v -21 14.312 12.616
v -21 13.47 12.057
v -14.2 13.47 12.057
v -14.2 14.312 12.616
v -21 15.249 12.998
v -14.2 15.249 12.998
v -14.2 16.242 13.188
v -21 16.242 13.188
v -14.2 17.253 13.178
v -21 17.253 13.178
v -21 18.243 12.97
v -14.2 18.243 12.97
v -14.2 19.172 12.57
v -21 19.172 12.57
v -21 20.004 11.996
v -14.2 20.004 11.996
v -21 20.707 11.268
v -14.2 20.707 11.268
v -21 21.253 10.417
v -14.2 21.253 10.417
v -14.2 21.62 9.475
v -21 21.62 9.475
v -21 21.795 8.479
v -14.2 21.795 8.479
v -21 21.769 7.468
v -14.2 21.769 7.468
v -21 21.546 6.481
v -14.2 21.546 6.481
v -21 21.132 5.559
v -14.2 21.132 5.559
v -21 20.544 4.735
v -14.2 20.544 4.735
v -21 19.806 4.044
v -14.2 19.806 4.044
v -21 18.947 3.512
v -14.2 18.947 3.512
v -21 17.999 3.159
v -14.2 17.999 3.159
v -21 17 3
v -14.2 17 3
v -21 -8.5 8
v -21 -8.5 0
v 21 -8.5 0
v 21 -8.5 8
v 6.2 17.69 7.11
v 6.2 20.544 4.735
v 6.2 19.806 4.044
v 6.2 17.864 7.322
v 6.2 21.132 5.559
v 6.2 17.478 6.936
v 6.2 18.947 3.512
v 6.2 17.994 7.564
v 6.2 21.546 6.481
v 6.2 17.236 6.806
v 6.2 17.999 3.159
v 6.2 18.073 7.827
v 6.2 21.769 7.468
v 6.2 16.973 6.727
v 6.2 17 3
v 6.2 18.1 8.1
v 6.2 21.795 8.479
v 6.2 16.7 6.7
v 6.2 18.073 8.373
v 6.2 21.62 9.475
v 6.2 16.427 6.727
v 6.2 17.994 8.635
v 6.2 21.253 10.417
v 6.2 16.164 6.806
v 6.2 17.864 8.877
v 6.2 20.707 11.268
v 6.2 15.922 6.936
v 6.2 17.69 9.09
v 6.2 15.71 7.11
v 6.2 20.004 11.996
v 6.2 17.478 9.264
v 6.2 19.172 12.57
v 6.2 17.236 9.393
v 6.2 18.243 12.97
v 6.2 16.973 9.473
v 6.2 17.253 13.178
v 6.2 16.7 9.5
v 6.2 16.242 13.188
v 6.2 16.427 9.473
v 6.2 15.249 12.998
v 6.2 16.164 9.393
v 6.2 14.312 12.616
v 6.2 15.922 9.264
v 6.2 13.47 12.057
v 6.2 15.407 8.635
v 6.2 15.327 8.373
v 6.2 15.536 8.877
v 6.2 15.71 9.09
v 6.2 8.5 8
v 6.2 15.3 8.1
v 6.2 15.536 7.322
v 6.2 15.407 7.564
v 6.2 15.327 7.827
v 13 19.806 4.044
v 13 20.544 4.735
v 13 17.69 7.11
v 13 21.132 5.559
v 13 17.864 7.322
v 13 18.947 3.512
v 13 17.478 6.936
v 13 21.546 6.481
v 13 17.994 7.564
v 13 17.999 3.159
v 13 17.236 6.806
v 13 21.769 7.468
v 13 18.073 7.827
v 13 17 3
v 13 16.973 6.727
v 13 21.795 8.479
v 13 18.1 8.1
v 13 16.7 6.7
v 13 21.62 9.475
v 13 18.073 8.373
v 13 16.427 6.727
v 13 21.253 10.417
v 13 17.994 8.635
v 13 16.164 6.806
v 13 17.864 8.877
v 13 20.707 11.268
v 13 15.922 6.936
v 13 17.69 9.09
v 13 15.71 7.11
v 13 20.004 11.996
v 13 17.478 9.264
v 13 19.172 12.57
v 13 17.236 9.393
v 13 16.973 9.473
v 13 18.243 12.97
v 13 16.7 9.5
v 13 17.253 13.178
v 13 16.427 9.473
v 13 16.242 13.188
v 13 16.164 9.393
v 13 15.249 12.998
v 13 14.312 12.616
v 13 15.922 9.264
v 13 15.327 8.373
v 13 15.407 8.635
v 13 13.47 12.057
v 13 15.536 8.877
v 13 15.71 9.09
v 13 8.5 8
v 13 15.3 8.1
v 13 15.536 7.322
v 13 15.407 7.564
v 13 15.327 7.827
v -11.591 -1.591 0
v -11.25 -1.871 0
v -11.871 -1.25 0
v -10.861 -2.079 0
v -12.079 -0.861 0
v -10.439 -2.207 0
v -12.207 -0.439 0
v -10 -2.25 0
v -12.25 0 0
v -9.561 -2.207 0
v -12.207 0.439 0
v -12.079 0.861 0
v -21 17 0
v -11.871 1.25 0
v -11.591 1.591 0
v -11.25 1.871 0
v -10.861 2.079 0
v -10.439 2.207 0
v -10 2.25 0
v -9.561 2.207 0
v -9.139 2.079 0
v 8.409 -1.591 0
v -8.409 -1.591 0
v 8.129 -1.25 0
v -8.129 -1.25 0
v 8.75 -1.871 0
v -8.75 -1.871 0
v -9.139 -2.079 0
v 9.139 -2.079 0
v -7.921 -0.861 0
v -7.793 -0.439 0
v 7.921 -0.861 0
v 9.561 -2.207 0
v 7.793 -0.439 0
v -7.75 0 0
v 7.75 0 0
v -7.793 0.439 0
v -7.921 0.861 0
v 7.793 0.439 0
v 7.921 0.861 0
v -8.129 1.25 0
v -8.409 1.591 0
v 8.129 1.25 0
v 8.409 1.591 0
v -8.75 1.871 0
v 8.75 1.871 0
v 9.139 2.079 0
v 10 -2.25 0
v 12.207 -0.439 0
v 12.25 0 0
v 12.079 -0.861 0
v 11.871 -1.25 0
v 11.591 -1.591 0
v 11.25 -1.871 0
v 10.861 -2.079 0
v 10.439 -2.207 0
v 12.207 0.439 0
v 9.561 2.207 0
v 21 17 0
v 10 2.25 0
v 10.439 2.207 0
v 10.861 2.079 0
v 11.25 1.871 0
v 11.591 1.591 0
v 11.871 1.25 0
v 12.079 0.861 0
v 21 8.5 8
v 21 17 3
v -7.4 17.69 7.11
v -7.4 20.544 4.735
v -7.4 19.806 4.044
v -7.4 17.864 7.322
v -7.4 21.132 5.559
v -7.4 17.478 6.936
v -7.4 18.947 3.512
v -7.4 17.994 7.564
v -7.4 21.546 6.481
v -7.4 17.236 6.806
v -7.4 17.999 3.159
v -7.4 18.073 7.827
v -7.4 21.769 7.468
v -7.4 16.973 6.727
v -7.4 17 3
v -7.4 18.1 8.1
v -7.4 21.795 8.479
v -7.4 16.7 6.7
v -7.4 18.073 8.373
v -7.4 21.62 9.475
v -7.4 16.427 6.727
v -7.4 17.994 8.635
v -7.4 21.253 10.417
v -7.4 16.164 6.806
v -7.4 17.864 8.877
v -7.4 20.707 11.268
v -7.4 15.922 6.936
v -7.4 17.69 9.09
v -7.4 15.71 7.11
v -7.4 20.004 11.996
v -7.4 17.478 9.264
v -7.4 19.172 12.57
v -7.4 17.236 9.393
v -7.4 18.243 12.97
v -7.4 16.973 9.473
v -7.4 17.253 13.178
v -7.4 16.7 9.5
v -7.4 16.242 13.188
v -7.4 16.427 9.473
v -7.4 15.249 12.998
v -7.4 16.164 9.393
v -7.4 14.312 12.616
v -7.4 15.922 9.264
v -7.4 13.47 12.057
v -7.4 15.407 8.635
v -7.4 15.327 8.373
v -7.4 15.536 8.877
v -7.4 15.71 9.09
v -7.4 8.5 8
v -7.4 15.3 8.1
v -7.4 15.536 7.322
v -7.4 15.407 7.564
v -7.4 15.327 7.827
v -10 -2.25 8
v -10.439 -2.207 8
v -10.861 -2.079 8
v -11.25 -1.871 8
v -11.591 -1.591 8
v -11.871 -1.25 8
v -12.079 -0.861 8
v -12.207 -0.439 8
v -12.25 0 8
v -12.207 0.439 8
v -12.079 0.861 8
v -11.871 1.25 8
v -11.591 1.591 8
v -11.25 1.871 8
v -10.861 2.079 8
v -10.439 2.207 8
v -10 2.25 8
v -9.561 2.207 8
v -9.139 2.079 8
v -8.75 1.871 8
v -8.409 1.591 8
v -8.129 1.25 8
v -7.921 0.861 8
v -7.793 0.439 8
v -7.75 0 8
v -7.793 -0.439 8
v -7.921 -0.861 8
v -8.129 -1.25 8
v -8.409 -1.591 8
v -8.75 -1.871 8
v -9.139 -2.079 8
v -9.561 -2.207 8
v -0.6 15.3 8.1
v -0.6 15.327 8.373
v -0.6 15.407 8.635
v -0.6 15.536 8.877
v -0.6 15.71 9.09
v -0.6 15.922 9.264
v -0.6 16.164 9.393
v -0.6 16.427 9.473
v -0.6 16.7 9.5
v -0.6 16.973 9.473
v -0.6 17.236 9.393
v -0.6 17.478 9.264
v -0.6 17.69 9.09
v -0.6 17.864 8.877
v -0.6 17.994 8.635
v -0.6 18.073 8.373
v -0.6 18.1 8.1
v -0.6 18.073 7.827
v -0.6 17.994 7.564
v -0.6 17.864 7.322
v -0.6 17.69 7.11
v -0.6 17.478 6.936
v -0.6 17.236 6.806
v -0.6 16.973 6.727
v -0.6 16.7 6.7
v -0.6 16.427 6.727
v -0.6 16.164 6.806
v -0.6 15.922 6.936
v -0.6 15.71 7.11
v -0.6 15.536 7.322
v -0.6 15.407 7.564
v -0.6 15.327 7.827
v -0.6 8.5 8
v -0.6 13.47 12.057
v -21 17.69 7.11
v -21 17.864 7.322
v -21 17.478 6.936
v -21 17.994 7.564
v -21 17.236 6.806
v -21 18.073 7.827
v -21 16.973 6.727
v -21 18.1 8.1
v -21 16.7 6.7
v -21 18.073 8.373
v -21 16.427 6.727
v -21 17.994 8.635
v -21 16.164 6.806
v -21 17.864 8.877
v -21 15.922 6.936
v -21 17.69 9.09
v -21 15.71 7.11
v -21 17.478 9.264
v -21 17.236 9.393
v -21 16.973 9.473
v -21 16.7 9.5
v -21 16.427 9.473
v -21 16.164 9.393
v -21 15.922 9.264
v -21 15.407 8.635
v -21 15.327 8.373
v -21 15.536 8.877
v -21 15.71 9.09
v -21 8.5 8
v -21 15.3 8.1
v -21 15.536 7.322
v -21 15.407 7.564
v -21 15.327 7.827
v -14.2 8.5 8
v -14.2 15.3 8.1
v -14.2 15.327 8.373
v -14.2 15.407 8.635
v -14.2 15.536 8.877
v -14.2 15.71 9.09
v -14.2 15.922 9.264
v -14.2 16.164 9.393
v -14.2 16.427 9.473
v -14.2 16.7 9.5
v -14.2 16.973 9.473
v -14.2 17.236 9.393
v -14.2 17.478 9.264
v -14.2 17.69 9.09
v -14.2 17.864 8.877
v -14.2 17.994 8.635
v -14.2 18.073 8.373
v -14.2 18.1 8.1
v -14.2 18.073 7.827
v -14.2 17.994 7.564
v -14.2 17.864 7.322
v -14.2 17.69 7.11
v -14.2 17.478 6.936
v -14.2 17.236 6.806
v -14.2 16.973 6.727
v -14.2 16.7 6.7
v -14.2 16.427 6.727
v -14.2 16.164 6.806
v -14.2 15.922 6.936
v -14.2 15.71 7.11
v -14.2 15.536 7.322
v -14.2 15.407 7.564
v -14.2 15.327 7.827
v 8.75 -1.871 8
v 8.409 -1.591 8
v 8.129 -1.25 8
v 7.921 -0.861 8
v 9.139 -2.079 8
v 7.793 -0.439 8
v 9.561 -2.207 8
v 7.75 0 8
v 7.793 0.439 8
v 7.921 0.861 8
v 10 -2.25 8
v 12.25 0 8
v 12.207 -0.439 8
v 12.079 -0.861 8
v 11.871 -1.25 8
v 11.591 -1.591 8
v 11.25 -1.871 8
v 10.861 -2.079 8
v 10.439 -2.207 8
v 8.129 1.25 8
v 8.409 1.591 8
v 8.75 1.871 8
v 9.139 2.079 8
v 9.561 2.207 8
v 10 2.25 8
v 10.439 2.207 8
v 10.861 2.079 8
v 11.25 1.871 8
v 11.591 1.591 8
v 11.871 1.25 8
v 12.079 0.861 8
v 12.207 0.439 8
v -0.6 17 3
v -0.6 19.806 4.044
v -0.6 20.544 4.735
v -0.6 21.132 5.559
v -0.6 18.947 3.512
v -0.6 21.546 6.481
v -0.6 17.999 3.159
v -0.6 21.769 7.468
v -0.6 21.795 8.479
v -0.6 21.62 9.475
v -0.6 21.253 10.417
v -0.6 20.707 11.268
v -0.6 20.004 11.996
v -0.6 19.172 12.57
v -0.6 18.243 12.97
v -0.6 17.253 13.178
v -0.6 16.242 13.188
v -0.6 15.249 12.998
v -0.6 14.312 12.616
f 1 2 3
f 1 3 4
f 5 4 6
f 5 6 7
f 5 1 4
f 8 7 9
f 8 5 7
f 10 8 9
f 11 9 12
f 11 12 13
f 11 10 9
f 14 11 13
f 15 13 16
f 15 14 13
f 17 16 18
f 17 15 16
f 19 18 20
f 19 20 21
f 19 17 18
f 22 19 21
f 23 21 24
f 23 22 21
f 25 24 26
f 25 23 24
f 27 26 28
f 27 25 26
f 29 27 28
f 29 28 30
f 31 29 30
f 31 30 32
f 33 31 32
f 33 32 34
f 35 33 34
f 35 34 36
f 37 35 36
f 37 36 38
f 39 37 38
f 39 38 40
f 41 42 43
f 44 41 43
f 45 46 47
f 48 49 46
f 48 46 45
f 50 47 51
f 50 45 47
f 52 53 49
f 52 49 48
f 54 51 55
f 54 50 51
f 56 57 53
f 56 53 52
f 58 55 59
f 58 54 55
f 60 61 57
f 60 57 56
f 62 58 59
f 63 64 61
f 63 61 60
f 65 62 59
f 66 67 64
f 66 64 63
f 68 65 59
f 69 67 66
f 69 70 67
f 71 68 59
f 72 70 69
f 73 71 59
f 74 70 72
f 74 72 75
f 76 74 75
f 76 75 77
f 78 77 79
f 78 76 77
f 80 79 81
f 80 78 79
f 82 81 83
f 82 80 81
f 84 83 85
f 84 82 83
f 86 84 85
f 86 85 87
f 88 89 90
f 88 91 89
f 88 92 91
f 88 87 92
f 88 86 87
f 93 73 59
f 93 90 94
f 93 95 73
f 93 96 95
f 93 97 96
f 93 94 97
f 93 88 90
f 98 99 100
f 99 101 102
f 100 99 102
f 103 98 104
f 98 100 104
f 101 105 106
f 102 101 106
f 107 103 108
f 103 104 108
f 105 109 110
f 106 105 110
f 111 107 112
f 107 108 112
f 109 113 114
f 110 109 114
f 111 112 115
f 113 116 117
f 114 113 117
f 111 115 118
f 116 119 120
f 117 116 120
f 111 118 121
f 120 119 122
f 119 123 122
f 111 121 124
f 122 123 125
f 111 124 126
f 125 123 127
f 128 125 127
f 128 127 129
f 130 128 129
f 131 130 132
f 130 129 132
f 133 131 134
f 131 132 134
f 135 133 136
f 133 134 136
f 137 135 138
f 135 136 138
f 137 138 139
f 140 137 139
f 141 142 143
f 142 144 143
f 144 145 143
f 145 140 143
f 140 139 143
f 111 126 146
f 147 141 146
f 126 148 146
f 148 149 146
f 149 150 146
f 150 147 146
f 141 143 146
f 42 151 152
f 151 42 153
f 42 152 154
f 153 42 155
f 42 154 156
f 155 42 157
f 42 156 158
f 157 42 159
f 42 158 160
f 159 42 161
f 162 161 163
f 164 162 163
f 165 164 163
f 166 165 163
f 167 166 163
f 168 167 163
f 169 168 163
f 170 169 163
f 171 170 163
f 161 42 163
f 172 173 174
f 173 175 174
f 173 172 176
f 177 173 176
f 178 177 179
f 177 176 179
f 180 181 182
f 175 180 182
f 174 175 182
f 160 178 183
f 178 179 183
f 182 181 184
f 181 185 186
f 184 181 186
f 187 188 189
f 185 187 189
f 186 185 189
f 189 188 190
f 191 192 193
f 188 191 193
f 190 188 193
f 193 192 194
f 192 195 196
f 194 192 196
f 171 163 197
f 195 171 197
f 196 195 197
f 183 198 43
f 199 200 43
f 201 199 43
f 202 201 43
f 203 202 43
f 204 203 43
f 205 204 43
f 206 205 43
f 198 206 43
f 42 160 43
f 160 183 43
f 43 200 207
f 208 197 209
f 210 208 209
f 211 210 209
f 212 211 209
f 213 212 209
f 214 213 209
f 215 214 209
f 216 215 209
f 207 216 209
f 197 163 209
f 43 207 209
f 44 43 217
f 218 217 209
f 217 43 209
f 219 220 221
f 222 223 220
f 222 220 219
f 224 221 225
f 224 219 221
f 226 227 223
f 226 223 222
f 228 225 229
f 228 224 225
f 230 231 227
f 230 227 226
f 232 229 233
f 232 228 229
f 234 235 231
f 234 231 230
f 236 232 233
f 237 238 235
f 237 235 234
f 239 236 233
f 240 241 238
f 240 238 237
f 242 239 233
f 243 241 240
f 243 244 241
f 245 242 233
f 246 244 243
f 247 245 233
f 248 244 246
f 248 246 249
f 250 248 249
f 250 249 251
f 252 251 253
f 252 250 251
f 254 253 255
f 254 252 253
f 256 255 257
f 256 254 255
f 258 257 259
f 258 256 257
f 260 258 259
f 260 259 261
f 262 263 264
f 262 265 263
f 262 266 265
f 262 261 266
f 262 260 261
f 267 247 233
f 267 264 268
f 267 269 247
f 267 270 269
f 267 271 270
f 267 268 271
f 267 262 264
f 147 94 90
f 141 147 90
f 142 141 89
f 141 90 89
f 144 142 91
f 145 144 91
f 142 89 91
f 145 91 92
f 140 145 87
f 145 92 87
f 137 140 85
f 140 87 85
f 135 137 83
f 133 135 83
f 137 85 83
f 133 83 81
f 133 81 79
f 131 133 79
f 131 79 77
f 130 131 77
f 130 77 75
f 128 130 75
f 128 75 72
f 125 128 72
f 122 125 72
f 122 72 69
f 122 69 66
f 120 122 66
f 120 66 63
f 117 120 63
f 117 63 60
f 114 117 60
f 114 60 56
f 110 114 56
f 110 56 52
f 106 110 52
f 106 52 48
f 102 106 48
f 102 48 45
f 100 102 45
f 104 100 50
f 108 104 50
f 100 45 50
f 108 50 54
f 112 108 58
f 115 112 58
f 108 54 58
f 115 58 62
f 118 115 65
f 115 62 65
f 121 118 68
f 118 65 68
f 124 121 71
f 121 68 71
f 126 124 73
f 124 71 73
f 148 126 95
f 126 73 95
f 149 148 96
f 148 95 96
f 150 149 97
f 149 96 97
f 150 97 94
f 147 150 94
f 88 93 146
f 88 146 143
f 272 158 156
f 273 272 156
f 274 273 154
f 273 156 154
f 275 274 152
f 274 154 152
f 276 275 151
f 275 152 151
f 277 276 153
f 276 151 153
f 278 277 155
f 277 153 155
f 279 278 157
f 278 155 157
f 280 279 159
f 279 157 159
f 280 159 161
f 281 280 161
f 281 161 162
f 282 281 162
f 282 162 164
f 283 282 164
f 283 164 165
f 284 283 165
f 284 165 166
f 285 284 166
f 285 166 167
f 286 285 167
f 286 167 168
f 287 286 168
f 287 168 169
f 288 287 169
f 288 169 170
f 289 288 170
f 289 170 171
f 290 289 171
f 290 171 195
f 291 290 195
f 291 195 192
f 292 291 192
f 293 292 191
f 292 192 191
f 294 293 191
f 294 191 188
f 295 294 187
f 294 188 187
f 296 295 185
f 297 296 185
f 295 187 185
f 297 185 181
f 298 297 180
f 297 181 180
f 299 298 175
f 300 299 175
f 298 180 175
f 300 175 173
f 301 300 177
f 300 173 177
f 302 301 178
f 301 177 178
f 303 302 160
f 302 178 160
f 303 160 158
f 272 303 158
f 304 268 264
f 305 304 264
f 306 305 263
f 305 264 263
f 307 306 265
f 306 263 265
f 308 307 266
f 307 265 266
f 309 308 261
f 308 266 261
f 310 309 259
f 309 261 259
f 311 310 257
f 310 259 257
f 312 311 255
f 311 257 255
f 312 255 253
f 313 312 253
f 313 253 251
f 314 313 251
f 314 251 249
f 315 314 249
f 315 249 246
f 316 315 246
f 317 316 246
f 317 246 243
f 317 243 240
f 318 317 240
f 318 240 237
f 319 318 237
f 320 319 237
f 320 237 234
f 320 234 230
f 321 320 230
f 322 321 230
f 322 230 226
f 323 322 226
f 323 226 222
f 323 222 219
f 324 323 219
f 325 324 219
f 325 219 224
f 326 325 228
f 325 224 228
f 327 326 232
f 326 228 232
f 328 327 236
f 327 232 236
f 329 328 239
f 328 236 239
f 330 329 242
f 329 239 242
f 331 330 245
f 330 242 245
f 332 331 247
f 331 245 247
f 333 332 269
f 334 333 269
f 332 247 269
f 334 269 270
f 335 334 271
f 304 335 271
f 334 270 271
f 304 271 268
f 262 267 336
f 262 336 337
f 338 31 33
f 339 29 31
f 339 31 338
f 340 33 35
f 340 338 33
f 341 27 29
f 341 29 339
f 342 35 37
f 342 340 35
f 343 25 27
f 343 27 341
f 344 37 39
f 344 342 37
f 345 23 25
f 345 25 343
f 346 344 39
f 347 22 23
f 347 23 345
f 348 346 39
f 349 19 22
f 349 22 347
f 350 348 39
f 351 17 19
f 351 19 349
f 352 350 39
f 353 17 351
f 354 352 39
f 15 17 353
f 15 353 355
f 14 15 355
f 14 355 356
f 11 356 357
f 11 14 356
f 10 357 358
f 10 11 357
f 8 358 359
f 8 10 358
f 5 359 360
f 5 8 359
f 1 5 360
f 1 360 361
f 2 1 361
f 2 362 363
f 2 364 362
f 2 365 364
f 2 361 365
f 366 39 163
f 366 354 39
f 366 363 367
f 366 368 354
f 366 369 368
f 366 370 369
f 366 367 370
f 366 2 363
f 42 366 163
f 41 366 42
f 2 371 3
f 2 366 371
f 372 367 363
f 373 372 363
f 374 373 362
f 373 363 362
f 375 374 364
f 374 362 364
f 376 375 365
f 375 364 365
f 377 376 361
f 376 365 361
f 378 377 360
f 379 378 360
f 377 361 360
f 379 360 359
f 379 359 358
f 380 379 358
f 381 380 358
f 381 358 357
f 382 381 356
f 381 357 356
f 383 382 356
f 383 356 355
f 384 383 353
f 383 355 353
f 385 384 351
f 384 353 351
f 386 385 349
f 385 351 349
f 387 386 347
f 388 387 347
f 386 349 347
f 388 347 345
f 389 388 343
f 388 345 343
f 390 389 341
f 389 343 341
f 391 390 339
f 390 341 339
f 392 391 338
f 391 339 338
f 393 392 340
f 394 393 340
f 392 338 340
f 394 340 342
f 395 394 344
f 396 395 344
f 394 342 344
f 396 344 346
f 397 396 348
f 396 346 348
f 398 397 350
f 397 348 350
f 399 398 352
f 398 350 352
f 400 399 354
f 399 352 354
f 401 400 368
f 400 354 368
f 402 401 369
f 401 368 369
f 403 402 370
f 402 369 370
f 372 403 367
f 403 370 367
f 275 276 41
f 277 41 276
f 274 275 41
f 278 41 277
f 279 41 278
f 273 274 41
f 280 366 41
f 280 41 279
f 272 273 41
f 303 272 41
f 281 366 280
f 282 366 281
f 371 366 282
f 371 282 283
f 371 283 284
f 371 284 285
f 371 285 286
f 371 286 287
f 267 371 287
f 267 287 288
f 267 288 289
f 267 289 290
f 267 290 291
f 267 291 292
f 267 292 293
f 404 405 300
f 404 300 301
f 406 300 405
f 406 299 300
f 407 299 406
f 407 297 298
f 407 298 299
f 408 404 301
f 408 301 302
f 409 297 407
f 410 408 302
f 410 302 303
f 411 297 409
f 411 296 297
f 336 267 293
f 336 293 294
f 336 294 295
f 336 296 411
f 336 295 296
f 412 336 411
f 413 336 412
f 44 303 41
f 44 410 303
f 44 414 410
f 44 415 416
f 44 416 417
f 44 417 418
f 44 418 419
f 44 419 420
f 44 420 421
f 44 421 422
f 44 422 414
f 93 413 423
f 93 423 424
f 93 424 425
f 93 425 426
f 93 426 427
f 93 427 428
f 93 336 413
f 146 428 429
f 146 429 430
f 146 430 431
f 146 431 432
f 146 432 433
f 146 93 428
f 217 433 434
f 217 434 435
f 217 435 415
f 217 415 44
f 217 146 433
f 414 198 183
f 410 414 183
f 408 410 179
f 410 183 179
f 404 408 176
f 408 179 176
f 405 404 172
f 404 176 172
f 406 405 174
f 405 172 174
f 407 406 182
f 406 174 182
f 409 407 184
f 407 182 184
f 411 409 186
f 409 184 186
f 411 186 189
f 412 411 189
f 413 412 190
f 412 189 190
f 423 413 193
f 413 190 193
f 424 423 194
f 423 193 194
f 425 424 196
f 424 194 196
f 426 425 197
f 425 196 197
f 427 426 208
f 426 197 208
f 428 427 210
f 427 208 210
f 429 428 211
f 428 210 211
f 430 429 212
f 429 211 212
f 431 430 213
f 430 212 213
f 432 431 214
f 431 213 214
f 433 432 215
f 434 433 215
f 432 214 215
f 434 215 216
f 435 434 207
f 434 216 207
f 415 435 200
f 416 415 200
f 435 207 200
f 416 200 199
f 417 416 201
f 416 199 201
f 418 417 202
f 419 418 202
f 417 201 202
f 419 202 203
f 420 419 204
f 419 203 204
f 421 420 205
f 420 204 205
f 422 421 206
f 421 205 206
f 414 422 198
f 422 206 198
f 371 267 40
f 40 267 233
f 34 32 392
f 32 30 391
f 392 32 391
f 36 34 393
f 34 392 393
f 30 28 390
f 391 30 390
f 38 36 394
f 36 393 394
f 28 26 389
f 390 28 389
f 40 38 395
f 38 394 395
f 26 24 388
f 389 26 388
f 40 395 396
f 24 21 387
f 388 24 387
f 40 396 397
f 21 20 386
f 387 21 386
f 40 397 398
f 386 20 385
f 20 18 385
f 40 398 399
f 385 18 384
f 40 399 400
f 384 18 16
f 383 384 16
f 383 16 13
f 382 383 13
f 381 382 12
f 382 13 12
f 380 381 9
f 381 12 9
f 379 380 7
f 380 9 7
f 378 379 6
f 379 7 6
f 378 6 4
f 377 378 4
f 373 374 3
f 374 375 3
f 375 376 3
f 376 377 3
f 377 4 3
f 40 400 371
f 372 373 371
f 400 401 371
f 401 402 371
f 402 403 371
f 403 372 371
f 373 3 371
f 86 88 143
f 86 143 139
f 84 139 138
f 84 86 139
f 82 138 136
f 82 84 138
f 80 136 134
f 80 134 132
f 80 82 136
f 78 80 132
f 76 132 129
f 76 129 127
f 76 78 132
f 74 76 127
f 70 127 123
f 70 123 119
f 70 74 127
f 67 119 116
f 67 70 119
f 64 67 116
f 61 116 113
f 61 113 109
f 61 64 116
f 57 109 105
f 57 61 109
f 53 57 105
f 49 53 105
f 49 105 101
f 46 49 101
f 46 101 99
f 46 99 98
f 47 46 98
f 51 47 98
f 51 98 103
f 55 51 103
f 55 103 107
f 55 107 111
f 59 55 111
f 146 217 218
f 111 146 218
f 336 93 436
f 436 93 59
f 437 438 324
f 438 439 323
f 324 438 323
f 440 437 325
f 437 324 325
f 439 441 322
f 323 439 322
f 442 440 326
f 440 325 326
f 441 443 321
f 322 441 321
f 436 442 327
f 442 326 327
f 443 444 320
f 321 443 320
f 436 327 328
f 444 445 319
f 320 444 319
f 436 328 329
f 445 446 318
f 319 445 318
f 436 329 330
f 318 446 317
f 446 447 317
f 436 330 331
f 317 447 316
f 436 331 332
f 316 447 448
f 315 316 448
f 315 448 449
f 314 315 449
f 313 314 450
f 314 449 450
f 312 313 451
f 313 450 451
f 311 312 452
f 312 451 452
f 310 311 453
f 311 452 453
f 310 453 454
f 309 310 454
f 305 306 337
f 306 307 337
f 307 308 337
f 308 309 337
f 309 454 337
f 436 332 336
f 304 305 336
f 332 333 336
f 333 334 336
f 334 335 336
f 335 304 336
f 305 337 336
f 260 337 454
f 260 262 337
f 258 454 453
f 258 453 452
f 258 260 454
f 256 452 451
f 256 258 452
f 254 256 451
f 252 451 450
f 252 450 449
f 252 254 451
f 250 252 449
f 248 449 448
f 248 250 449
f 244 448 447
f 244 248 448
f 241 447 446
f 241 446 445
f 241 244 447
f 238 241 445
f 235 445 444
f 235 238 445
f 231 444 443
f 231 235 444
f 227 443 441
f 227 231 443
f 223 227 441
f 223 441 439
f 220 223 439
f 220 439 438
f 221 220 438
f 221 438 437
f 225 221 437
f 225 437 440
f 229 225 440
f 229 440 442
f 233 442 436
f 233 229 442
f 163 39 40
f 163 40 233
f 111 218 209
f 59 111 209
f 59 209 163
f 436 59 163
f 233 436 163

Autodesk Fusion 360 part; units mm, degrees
sketch "Sketch1" plane through (0, 0, 0) normal (0, 0, 1) x (1, 0, 0)
  line L0 (21, 8.5) -> (-21, 8.5)
  line L1 (-21, 8.5) -> (-21, -8.5)
  line L2 (-21, -8.5) -> (21, -8.5)
  line L3 (21, -8.5) -> (21, 8.5)
  line L4 (21, 8.5) -> (-21, -8.5) construction
  line L5 (-21, 8.5) -> (21, -8.5) construction
  dimension "d1" = 17
  dimension "d2" = 42
extrude "Extrude1" add sketch "Sketch1" along normal blind 8
sketch "Sketch2" plane through (0, 0, 8) normal (0, 0, 1) x (-1, 0, 0)
  line L0 (-21, 8.5) -> (-21, -8.5)
  line L1 (-21, -8.5) -> (21, -8.5)
  line L2 (21, -8.5) -> (21, 8.5)
  line L3 (21, 8.5) -> (-21, 8.5)
  circle A0 centre (14, 0) radius 3.15
  circle A1 centre (-14, 0) radius 3.15
  dimension "d6" = 6.3
  dimension "d7" = 6.3
  dimension "d8" = 28
  dimension "d9" = 7
sketch "Sketch3" plane through (21, 0, 0) normal (1, 0, 0) x (0, 1, 0)
  line L0 (-8.5, 0) -> (8.5, 0)
  line L1 (8.5, 0) -> (8.5, 8)
  line L2 (8.5, 8) -> (-8.5, 8)
  line L3 (-8.5, 8) -> (-8.5, 0)
  line L4 (8.5, 8) -> (17, 3)
  line L5 (17, 3) -> (17, 0)
  line L6 (17, 0) -> (8.5, 0)
  dimension "d23" = 8.5
  dimension "d24" = 3
extrude "Extrude3" add sketch "Sketch3" against normal up to surface (42 mm away) contours L1 L4 L5 L6
sketch "Sketch4" plane through (-21, 0, 0) normal (-1, 0, 0) x (0, -1, 0)
  line L0 (-17, 0) -> (8.5, 0)
  line L1 (8.5, 0) -> (8.5, 8)
  line L2 (8.5, 8) -> (-8.5, 8)
  line L3 (-8.5, 8) -> (-17, 3)
  line L4 (-17, 3) -> (-17, 0)
  line L5 (-8.5, 8) -> (-13.4696, 12.057)
  arc A0 (-13.4696, 12.057) -> (-17, 3) centre (-16.7002, 8.0997) ccw
extrude "Extrude4" add sketch "Sketch4" against normal blind 6.8 contours L3 L5 A0
extrude "Extrude5" add 1 faces at (-14.2, 12.9899, 7.6857) along direction (1, 0, 0) blind 6.8 from surface at 6.8
extrude "Extrude6" add 1 faces at (-0.6, 12.9899, 7.6857) along direction (1, 0, 0) blind 6.8 from surface at 6.8
sketch "Sketch5" plane through (-21, 0, 0) normal (-1, 0, 0) x (0, -1, 0)
  line L0 (-17, 0) -> (8.5, 0)
  line L1 (8.5, 0) -> (8.5, 8)
  line L2 (8.5, 8) -> (-8.5, 8)
  line L3 (-8.5, 8) -> (-13.4696, 12.057)
  arc A0 (-13.4696, 12.057) -> (-17, 3) centre (-16.7002, 8.0997) ccw
  line L4 (-17, 3) -> (-17, 0)
  circle A1 centre (-16.7002, 8.0997) radius 1.4
  dimension "d35" = 2.8
extrude "Extrude7" cut sketch "Sketch5" against normal up to surface (34 mm away) contours A1
sketch "Sketch8" plane through (0, 0, 8) normal (0, 0, 1) x (-1, 0, 0)
  line L0 (-21, 8.5) -> (-21, -8.5)
  line L1 (-21, -8.5) -> (-13, -8.5)
  line L2 (-13, -8.5) -> (-6.2, -8.5)
  line L3 (-6.2, -8.5) -> (0.6, -8.5)
  line L4 (0.6, -8.5) -> (7.4, -8.5)
  line L5 (7.4, -8.5) -> (14.2, -8.5)
  line L6 (14.2, -8.5) -> (21, -8.5)
  line L7 (21, -8.5) -> (21, 8.5)
  line L8 (21, 8.5) -> (-21, 8.5)
  line L9 (21, 0) -> (-21, 0) construction
  circle A0 centre (10, 0) radius 2.25 construction
  circle A1 centre (-10, 0) radius 2.25 construction
  dimension "d49" = 20
  dimension "d50" = 4.5
  dimension "d51" = 11
  dimension "d52" = 11
hole "Hole3" at (-10, 0, 8) at (10, 0, 8) direction (0, 0, -1) diameter 4.5 depth 10 tip angle 118
